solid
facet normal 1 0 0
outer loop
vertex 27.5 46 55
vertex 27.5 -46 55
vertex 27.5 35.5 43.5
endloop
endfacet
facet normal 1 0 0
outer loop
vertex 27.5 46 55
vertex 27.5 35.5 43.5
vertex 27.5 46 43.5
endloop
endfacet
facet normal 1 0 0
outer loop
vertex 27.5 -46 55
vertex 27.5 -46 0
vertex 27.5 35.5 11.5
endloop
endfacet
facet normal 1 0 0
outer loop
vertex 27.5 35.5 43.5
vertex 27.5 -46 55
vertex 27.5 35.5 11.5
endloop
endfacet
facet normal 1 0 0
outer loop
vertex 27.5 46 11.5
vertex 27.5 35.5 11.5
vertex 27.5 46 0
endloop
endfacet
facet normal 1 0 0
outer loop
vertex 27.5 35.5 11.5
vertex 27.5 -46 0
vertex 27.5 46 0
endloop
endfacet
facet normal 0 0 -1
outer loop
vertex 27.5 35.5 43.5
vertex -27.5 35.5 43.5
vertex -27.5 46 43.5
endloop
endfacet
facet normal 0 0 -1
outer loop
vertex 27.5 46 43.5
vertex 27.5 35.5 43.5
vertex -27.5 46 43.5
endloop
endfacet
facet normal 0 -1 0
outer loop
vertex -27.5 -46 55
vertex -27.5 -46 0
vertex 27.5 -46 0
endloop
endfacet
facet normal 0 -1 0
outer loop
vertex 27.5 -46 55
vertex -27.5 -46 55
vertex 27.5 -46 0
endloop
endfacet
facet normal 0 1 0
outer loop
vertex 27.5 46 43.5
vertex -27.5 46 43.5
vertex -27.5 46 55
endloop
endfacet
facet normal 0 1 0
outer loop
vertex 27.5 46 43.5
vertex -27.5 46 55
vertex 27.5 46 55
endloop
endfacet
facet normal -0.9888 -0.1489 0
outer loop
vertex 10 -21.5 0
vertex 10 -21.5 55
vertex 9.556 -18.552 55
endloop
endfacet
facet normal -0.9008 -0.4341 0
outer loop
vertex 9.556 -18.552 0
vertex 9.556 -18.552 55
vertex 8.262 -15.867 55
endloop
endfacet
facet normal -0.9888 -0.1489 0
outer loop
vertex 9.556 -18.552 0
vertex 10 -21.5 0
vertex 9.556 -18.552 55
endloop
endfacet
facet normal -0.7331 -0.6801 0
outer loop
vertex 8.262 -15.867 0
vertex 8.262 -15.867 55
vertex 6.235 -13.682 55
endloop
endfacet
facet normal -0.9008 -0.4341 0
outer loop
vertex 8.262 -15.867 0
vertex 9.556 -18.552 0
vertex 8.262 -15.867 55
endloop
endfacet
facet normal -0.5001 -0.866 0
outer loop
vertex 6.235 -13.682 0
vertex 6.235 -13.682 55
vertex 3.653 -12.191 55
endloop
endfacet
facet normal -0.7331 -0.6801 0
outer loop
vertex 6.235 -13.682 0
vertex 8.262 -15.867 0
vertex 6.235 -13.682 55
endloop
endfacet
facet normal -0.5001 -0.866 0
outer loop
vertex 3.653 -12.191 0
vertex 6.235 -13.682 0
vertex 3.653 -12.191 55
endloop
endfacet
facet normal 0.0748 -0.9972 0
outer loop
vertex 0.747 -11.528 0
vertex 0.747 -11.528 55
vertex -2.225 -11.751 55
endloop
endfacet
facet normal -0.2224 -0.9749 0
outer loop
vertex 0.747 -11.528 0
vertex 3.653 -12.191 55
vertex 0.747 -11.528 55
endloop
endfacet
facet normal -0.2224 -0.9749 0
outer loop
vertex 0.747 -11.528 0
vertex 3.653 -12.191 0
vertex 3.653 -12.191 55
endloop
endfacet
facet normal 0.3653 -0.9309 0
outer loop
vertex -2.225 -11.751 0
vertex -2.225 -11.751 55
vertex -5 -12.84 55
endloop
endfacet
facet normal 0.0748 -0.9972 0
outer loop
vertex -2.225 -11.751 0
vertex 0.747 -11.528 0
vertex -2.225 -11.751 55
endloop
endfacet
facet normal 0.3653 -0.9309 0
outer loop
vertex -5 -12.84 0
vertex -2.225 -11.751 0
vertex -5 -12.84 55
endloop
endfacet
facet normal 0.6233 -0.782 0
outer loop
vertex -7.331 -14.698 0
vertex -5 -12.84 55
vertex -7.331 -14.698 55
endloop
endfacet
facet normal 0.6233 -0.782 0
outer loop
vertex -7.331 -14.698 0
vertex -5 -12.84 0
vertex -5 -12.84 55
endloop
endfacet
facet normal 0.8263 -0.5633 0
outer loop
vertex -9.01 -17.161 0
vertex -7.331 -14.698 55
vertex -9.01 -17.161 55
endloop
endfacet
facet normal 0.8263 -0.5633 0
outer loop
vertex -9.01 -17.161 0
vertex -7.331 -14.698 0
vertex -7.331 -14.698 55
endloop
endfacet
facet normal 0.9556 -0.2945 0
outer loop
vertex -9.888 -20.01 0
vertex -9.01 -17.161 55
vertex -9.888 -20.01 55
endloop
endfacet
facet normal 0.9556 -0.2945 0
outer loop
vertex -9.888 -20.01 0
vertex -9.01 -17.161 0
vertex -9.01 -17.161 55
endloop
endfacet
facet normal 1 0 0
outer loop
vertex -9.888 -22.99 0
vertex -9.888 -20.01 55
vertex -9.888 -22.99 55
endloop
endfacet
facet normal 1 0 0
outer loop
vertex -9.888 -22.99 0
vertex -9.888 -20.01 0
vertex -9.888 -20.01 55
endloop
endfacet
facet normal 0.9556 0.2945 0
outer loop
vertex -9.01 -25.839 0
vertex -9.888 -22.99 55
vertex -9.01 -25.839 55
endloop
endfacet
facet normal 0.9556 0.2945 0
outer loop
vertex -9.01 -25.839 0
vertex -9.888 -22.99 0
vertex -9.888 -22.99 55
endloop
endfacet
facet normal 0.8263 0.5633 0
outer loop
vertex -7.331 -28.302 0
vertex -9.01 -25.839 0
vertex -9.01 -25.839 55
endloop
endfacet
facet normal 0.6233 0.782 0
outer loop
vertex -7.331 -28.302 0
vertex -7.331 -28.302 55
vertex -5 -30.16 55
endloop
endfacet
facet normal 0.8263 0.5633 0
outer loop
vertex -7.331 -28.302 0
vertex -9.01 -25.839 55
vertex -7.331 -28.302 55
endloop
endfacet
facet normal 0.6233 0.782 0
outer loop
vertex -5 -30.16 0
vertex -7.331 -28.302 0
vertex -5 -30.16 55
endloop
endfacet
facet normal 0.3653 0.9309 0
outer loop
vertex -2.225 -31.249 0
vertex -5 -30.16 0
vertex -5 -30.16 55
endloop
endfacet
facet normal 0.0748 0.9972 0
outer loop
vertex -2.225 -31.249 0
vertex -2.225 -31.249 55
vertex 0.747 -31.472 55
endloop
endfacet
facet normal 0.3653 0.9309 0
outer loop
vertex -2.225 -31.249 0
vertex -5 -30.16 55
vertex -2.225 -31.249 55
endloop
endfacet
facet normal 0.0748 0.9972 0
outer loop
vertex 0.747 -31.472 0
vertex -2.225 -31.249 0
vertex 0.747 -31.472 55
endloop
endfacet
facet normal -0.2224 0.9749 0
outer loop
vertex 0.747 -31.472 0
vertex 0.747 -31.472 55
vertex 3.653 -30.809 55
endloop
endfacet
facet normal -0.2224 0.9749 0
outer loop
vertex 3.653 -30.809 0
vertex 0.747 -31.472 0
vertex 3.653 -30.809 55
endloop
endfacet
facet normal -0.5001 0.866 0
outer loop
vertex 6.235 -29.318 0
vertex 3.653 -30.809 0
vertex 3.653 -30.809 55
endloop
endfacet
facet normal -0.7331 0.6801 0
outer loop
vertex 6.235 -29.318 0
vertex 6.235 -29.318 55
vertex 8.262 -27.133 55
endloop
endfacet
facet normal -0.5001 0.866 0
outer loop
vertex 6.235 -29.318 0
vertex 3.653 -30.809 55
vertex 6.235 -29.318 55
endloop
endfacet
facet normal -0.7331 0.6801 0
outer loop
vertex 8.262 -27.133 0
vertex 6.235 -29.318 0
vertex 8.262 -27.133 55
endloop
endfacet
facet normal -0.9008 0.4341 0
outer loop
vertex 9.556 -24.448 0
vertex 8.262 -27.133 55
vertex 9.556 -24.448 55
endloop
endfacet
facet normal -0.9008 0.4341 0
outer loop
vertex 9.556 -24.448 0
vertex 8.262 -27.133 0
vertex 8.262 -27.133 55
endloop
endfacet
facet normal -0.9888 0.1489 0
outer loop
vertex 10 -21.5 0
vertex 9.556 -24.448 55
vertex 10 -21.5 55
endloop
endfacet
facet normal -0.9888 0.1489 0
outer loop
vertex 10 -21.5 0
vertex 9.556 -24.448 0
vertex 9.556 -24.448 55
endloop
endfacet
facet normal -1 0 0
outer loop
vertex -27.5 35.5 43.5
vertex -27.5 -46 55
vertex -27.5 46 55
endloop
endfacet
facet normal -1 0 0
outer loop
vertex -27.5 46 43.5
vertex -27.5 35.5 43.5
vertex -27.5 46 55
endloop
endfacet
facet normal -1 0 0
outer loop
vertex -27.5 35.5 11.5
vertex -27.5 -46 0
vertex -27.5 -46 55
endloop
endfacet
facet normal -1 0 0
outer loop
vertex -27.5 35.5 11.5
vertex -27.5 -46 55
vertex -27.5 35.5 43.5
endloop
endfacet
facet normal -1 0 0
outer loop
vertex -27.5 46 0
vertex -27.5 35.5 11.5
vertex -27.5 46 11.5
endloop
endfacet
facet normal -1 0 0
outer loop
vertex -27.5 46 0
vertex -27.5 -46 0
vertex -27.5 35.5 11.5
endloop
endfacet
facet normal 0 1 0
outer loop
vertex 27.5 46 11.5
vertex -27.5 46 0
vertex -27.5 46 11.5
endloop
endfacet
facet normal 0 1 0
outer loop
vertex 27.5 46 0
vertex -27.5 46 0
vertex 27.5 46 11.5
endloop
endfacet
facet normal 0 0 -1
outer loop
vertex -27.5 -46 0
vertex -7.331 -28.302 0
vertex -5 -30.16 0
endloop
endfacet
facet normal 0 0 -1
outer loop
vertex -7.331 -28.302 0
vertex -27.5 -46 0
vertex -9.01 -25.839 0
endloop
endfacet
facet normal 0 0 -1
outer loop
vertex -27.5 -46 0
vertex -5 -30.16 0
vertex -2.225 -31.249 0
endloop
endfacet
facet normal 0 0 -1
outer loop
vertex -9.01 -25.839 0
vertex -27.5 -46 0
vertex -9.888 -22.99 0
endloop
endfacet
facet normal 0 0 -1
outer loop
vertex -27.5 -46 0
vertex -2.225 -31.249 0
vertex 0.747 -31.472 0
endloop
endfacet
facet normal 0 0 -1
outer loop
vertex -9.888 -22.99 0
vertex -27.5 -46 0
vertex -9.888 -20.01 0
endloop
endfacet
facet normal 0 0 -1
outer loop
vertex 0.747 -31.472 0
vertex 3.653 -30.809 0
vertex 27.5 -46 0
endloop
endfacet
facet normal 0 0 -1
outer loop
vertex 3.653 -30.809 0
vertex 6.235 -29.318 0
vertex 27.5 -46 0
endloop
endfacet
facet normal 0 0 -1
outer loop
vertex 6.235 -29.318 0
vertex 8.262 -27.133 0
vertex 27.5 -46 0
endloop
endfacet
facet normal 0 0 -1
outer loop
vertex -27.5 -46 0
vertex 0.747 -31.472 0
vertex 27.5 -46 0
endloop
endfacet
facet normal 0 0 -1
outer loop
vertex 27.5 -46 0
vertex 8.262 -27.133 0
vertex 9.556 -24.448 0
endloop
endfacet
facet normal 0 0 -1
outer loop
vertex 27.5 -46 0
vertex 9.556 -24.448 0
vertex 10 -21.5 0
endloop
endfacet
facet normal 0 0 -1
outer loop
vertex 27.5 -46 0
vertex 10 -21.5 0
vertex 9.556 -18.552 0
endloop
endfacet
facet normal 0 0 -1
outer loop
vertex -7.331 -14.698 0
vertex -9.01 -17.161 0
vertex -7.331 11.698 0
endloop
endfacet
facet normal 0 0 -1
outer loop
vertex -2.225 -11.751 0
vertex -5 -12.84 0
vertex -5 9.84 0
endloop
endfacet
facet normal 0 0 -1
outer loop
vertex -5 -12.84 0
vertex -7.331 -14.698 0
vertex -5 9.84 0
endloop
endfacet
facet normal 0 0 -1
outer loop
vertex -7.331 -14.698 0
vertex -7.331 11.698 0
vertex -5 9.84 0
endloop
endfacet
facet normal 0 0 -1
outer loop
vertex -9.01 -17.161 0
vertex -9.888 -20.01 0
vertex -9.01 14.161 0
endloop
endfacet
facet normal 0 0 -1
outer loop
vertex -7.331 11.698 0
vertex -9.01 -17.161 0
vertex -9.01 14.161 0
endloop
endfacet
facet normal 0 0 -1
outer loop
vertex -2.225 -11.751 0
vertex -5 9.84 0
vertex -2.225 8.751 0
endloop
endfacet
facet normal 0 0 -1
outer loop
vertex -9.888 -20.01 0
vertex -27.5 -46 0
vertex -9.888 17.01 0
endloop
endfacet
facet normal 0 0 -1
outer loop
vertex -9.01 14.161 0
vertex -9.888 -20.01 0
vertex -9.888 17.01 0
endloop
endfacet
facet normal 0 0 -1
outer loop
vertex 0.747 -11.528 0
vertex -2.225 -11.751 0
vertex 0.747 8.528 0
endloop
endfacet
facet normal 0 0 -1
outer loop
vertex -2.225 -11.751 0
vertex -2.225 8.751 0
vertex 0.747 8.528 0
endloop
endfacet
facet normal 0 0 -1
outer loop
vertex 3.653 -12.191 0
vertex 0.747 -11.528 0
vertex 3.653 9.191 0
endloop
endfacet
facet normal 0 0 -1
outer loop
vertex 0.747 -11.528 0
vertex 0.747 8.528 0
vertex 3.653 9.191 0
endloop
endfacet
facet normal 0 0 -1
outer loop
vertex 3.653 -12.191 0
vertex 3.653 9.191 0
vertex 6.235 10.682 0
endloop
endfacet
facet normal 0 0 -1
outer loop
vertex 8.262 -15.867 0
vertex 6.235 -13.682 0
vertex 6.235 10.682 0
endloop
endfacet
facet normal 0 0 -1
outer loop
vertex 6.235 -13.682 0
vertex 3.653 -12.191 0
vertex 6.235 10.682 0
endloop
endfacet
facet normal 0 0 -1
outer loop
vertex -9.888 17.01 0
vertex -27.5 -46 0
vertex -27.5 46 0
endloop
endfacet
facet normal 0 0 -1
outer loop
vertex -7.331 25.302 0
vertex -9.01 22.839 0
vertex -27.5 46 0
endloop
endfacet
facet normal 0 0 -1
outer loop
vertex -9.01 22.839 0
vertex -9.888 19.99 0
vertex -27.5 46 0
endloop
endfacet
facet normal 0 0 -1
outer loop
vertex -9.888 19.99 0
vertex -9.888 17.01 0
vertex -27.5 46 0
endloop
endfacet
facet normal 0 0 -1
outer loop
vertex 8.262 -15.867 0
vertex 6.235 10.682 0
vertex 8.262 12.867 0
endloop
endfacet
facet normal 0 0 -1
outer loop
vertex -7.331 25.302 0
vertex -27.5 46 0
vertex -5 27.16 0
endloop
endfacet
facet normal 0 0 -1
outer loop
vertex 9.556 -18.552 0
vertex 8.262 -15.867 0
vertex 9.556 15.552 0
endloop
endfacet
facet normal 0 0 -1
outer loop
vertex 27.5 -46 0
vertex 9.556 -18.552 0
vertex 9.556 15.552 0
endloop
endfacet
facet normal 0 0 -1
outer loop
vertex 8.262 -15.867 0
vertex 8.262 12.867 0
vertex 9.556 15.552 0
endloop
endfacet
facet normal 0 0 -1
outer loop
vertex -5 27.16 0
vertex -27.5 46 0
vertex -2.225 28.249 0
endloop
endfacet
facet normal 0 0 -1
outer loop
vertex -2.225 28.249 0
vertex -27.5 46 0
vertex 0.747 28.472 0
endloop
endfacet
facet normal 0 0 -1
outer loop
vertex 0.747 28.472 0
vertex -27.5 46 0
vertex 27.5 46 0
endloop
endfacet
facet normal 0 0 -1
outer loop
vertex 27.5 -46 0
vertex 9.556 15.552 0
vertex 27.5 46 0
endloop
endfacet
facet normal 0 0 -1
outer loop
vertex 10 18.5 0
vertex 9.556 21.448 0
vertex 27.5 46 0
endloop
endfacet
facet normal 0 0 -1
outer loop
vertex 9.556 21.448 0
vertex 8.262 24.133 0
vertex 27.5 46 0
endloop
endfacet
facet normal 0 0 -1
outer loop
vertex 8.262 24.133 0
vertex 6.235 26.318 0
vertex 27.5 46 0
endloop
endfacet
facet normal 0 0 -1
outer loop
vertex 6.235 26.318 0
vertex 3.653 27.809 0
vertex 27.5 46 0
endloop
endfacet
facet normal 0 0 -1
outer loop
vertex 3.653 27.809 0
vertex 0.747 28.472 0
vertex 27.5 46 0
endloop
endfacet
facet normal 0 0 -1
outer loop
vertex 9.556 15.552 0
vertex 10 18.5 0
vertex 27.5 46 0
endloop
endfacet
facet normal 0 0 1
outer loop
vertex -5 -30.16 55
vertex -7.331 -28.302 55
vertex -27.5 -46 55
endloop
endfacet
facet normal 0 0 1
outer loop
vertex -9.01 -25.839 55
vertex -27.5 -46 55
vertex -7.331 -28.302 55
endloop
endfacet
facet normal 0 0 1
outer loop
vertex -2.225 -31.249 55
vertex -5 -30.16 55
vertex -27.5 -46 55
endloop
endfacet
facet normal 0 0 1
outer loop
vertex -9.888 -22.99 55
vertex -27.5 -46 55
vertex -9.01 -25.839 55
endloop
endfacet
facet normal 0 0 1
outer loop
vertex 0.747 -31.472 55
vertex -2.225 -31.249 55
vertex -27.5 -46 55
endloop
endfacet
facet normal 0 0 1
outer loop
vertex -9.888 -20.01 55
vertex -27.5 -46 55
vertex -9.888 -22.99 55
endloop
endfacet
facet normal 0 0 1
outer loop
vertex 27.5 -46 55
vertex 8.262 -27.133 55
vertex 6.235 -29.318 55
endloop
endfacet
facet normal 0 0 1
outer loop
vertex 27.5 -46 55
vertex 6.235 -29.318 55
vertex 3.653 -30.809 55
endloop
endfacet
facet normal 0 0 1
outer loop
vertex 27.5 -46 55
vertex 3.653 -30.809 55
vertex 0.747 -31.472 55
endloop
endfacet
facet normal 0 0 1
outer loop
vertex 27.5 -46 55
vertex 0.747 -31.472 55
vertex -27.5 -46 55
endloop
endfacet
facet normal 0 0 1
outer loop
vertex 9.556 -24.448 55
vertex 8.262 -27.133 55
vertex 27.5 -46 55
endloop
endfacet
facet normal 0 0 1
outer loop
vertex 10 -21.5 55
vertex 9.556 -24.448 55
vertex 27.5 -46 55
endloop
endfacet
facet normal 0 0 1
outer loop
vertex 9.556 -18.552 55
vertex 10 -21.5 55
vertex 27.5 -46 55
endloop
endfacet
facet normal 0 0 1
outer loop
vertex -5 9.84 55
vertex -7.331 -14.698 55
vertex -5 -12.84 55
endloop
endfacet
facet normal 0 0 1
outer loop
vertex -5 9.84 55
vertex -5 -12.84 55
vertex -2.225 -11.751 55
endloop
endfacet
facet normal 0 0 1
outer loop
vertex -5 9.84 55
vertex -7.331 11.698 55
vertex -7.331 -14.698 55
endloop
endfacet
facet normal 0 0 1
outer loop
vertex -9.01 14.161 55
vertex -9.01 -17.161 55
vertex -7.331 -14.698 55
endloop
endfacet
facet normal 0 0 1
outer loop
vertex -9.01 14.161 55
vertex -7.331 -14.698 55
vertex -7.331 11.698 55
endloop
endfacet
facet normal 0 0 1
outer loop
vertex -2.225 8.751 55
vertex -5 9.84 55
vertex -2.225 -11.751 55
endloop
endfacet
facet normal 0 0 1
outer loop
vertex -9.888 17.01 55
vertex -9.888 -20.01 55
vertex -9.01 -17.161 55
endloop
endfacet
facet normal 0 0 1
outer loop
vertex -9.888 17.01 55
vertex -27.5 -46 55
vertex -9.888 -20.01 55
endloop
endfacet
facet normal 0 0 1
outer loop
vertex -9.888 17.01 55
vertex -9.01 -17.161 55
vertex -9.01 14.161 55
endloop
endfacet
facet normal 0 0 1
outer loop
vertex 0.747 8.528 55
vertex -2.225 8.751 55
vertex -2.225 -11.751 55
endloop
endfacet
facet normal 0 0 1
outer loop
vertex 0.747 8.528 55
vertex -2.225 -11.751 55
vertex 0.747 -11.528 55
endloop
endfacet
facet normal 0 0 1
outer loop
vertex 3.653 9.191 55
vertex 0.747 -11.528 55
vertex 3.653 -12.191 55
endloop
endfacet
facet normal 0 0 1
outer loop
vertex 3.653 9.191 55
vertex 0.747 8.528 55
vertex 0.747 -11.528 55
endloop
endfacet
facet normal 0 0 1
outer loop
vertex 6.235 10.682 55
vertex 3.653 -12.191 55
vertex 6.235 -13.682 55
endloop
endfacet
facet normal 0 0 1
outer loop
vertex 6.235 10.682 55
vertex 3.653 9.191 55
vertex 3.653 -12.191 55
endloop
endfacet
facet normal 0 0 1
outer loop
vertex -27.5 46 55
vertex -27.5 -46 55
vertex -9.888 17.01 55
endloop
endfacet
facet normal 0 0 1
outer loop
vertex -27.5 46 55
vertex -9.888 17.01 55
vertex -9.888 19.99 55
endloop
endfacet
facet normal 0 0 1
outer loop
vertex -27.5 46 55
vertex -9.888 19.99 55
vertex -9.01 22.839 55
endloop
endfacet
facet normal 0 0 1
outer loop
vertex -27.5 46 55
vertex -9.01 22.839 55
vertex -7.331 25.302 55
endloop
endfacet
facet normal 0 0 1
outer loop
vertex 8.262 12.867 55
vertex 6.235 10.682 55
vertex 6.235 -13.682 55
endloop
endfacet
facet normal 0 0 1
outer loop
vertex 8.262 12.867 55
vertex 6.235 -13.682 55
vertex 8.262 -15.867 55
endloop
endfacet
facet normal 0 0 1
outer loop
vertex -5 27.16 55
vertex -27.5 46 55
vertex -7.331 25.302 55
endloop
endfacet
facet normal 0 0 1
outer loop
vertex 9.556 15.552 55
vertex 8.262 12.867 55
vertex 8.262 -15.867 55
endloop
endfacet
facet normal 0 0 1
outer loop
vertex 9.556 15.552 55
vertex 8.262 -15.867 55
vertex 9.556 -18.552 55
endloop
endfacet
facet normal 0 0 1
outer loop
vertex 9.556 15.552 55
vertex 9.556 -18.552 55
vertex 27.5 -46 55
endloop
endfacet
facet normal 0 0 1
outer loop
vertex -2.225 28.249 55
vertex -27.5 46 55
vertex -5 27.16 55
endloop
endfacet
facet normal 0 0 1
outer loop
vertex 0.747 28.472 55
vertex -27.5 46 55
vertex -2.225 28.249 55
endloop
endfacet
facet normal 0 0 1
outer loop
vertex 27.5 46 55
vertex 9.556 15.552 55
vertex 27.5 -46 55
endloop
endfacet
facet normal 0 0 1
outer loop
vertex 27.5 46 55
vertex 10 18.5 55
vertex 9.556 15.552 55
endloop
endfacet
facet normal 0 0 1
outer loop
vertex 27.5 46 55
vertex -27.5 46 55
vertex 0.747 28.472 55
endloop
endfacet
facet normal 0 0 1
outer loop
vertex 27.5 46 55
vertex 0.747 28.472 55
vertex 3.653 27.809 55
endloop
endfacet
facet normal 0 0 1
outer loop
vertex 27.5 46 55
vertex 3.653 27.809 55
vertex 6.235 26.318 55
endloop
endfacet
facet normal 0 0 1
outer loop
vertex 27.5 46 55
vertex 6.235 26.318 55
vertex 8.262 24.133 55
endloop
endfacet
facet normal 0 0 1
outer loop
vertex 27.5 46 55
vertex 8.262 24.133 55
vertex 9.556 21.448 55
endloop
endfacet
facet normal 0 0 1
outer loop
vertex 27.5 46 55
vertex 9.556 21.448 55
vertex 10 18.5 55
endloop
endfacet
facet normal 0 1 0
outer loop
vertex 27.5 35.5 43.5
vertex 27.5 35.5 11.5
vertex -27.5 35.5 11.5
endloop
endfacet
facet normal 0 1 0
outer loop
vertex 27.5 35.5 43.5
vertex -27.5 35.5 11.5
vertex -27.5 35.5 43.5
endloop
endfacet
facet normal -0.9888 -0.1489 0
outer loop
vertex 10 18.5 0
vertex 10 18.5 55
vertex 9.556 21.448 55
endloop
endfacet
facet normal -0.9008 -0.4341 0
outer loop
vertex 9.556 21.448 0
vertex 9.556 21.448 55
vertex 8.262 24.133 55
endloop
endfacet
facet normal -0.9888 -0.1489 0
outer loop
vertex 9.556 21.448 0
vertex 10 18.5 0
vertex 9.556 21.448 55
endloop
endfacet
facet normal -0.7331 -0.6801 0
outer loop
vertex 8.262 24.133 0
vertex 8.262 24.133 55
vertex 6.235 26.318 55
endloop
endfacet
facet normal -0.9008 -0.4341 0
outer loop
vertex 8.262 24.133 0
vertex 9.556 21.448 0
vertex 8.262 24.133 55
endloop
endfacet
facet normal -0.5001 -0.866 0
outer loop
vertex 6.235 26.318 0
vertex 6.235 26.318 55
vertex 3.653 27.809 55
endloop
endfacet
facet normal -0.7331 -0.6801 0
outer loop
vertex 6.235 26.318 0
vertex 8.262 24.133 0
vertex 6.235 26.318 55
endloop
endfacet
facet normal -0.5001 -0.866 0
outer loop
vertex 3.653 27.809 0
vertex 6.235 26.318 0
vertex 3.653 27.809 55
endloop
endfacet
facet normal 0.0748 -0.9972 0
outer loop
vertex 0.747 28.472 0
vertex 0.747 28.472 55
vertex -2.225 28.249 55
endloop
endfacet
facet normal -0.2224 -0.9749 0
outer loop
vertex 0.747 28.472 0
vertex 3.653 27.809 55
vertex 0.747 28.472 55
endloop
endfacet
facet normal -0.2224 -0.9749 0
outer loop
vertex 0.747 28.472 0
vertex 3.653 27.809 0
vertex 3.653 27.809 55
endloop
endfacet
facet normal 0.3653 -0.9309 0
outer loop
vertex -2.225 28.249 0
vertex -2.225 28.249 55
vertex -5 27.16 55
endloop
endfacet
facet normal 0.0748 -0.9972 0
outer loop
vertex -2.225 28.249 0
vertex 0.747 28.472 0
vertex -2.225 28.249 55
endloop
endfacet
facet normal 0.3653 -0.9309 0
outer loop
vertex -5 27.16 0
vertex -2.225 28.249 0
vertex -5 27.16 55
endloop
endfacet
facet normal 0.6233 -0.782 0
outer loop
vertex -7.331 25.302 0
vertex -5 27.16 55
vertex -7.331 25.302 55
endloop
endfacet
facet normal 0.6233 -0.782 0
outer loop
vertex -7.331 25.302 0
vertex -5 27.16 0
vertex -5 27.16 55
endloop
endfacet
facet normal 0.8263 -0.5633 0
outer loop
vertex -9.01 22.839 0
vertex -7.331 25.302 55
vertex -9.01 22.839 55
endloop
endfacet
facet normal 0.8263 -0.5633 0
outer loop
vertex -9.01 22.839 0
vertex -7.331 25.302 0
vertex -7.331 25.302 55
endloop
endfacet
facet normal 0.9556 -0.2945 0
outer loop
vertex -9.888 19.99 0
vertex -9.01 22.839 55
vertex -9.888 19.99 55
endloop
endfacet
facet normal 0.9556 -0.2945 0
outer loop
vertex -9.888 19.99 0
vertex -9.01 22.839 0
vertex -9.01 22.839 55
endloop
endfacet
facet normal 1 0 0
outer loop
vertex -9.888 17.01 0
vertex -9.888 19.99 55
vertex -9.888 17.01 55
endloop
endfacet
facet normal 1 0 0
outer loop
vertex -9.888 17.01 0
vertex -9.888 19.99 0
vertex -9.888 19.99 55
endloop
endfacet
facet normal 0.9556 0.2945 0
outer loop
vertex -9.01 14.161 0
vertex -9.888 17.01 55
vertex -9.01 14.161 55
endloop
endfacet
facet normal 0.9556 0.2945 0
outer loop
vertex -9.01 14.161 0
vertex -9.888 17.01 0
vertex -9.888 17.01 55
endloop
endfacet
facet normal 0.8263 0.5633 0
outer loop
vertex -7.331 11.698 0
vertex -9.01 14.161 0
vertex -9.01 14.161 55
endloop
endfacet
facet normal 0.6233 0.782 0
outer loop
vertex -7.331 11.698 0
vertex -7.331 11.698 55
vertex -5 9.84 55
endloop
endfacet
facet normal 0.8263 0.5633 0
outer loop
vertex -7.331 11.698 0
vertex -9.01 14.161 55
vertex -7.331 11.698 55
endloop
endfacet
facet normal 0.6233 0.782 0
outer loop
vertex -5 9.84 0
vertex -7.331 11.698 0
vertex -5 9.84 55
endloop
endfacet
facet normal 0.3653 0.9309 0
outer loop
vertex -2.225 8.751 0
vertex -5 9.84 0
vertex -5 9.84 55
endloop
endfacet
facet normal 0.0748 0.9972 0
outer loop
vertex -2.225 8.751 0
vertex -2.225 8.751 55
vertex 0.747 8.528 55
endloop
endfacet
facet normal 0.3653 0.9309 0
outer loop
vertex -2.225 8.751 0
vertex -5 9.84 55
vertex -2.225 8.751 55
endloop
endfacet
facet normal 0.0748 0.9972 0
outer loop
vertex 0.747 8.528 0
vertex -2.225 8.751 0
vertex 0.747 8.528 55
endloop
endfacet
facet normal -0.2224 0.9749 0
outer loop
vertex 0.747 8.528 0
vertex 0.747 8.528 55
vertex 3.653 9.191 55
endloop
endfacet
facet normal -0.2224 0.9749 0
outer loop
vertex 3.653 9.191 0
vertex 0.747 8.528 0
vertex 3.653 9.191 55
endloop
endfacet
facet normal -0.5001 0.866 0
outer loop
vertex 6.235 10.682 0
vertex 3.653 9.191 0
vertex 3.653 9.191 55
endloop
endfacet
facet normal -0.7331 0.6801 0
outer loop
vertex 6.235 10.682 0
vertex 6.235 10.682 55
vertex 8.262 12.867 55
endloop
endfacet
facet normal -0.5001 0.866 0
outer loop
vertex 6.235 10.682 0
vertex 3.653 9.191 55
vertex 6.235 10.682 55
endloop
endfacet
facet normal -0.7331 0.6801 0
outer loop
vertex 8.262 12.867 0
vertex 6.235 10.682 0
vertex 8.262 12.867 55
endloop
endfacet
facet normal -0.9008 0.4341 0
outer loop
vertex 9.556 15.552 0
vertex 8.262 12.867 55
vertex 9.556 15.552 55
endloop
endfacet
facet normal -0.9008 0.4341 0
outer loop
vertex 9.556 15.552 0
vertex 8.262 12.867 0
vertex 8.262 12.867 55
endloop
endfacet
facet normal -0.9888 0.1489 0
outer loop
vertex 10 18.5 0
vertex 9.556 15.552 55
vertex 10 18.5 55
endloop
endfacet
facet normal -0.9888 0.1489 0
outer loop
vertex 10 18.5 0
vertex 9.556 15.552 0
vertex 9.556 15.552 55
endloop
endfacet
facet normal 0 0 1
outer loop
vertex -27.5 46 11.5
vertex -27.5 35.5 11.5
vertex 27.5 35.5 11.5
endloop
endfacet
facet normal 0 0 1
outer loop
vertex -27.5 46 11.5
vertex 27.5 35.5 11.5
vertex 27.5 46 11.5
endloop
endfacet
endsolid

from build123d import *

# Parameters (mm, degrees)
CROQUIS1_W              = 55
CROQUIS1_H              = 92
SALIENTE_EXTRUIR1_DEPTH = 55
CROQUIS2_R              = 10
CORTAR_EXTRUIR1_DEPTH   = 56
CROQUIS3_W              = 32
CROQUIS3_H              = 10.5
CORTAR_EXTRUIR2_DEPTH   = 55


with BuildPart() as part:
    # Croquis1 → Saliente-Extruir1 (new body)
    with BuildSketch(Plane.XY):
        Rectangle(CROQUIS1_W, CROQUIS1_H)
    extrude(amount=SALIENTE_EXTRUIR1_DEPTH)

    # Croquis2 → Cortar-Extruir1 (cut, through all)
    with BuildSketch(Plane.XY):
        with Locations((0, 18.5)):
            Circle(CROQUIS2_R)
        with Locations((0, -21.5)):
            Circle(CROQUIS2_R)
    extrude(amount=CORTAR_EXTRUIR1_DEPTH, mode=Mode.SUBTRACT)

    # Croquis3 → Cortar-Extruir2 (cut)
    with BuildSketch(Plane.ZY.offset(27.5)):
        with Locations((27.5, 40.75)):
            Rectangle(CROQUIS3_W, CROQUIS3_H)
    extrude(amount=-CORTAR_EXTRUIR2_DEPTH, mode=Mode.SUBTRACT)


solid = part.part
